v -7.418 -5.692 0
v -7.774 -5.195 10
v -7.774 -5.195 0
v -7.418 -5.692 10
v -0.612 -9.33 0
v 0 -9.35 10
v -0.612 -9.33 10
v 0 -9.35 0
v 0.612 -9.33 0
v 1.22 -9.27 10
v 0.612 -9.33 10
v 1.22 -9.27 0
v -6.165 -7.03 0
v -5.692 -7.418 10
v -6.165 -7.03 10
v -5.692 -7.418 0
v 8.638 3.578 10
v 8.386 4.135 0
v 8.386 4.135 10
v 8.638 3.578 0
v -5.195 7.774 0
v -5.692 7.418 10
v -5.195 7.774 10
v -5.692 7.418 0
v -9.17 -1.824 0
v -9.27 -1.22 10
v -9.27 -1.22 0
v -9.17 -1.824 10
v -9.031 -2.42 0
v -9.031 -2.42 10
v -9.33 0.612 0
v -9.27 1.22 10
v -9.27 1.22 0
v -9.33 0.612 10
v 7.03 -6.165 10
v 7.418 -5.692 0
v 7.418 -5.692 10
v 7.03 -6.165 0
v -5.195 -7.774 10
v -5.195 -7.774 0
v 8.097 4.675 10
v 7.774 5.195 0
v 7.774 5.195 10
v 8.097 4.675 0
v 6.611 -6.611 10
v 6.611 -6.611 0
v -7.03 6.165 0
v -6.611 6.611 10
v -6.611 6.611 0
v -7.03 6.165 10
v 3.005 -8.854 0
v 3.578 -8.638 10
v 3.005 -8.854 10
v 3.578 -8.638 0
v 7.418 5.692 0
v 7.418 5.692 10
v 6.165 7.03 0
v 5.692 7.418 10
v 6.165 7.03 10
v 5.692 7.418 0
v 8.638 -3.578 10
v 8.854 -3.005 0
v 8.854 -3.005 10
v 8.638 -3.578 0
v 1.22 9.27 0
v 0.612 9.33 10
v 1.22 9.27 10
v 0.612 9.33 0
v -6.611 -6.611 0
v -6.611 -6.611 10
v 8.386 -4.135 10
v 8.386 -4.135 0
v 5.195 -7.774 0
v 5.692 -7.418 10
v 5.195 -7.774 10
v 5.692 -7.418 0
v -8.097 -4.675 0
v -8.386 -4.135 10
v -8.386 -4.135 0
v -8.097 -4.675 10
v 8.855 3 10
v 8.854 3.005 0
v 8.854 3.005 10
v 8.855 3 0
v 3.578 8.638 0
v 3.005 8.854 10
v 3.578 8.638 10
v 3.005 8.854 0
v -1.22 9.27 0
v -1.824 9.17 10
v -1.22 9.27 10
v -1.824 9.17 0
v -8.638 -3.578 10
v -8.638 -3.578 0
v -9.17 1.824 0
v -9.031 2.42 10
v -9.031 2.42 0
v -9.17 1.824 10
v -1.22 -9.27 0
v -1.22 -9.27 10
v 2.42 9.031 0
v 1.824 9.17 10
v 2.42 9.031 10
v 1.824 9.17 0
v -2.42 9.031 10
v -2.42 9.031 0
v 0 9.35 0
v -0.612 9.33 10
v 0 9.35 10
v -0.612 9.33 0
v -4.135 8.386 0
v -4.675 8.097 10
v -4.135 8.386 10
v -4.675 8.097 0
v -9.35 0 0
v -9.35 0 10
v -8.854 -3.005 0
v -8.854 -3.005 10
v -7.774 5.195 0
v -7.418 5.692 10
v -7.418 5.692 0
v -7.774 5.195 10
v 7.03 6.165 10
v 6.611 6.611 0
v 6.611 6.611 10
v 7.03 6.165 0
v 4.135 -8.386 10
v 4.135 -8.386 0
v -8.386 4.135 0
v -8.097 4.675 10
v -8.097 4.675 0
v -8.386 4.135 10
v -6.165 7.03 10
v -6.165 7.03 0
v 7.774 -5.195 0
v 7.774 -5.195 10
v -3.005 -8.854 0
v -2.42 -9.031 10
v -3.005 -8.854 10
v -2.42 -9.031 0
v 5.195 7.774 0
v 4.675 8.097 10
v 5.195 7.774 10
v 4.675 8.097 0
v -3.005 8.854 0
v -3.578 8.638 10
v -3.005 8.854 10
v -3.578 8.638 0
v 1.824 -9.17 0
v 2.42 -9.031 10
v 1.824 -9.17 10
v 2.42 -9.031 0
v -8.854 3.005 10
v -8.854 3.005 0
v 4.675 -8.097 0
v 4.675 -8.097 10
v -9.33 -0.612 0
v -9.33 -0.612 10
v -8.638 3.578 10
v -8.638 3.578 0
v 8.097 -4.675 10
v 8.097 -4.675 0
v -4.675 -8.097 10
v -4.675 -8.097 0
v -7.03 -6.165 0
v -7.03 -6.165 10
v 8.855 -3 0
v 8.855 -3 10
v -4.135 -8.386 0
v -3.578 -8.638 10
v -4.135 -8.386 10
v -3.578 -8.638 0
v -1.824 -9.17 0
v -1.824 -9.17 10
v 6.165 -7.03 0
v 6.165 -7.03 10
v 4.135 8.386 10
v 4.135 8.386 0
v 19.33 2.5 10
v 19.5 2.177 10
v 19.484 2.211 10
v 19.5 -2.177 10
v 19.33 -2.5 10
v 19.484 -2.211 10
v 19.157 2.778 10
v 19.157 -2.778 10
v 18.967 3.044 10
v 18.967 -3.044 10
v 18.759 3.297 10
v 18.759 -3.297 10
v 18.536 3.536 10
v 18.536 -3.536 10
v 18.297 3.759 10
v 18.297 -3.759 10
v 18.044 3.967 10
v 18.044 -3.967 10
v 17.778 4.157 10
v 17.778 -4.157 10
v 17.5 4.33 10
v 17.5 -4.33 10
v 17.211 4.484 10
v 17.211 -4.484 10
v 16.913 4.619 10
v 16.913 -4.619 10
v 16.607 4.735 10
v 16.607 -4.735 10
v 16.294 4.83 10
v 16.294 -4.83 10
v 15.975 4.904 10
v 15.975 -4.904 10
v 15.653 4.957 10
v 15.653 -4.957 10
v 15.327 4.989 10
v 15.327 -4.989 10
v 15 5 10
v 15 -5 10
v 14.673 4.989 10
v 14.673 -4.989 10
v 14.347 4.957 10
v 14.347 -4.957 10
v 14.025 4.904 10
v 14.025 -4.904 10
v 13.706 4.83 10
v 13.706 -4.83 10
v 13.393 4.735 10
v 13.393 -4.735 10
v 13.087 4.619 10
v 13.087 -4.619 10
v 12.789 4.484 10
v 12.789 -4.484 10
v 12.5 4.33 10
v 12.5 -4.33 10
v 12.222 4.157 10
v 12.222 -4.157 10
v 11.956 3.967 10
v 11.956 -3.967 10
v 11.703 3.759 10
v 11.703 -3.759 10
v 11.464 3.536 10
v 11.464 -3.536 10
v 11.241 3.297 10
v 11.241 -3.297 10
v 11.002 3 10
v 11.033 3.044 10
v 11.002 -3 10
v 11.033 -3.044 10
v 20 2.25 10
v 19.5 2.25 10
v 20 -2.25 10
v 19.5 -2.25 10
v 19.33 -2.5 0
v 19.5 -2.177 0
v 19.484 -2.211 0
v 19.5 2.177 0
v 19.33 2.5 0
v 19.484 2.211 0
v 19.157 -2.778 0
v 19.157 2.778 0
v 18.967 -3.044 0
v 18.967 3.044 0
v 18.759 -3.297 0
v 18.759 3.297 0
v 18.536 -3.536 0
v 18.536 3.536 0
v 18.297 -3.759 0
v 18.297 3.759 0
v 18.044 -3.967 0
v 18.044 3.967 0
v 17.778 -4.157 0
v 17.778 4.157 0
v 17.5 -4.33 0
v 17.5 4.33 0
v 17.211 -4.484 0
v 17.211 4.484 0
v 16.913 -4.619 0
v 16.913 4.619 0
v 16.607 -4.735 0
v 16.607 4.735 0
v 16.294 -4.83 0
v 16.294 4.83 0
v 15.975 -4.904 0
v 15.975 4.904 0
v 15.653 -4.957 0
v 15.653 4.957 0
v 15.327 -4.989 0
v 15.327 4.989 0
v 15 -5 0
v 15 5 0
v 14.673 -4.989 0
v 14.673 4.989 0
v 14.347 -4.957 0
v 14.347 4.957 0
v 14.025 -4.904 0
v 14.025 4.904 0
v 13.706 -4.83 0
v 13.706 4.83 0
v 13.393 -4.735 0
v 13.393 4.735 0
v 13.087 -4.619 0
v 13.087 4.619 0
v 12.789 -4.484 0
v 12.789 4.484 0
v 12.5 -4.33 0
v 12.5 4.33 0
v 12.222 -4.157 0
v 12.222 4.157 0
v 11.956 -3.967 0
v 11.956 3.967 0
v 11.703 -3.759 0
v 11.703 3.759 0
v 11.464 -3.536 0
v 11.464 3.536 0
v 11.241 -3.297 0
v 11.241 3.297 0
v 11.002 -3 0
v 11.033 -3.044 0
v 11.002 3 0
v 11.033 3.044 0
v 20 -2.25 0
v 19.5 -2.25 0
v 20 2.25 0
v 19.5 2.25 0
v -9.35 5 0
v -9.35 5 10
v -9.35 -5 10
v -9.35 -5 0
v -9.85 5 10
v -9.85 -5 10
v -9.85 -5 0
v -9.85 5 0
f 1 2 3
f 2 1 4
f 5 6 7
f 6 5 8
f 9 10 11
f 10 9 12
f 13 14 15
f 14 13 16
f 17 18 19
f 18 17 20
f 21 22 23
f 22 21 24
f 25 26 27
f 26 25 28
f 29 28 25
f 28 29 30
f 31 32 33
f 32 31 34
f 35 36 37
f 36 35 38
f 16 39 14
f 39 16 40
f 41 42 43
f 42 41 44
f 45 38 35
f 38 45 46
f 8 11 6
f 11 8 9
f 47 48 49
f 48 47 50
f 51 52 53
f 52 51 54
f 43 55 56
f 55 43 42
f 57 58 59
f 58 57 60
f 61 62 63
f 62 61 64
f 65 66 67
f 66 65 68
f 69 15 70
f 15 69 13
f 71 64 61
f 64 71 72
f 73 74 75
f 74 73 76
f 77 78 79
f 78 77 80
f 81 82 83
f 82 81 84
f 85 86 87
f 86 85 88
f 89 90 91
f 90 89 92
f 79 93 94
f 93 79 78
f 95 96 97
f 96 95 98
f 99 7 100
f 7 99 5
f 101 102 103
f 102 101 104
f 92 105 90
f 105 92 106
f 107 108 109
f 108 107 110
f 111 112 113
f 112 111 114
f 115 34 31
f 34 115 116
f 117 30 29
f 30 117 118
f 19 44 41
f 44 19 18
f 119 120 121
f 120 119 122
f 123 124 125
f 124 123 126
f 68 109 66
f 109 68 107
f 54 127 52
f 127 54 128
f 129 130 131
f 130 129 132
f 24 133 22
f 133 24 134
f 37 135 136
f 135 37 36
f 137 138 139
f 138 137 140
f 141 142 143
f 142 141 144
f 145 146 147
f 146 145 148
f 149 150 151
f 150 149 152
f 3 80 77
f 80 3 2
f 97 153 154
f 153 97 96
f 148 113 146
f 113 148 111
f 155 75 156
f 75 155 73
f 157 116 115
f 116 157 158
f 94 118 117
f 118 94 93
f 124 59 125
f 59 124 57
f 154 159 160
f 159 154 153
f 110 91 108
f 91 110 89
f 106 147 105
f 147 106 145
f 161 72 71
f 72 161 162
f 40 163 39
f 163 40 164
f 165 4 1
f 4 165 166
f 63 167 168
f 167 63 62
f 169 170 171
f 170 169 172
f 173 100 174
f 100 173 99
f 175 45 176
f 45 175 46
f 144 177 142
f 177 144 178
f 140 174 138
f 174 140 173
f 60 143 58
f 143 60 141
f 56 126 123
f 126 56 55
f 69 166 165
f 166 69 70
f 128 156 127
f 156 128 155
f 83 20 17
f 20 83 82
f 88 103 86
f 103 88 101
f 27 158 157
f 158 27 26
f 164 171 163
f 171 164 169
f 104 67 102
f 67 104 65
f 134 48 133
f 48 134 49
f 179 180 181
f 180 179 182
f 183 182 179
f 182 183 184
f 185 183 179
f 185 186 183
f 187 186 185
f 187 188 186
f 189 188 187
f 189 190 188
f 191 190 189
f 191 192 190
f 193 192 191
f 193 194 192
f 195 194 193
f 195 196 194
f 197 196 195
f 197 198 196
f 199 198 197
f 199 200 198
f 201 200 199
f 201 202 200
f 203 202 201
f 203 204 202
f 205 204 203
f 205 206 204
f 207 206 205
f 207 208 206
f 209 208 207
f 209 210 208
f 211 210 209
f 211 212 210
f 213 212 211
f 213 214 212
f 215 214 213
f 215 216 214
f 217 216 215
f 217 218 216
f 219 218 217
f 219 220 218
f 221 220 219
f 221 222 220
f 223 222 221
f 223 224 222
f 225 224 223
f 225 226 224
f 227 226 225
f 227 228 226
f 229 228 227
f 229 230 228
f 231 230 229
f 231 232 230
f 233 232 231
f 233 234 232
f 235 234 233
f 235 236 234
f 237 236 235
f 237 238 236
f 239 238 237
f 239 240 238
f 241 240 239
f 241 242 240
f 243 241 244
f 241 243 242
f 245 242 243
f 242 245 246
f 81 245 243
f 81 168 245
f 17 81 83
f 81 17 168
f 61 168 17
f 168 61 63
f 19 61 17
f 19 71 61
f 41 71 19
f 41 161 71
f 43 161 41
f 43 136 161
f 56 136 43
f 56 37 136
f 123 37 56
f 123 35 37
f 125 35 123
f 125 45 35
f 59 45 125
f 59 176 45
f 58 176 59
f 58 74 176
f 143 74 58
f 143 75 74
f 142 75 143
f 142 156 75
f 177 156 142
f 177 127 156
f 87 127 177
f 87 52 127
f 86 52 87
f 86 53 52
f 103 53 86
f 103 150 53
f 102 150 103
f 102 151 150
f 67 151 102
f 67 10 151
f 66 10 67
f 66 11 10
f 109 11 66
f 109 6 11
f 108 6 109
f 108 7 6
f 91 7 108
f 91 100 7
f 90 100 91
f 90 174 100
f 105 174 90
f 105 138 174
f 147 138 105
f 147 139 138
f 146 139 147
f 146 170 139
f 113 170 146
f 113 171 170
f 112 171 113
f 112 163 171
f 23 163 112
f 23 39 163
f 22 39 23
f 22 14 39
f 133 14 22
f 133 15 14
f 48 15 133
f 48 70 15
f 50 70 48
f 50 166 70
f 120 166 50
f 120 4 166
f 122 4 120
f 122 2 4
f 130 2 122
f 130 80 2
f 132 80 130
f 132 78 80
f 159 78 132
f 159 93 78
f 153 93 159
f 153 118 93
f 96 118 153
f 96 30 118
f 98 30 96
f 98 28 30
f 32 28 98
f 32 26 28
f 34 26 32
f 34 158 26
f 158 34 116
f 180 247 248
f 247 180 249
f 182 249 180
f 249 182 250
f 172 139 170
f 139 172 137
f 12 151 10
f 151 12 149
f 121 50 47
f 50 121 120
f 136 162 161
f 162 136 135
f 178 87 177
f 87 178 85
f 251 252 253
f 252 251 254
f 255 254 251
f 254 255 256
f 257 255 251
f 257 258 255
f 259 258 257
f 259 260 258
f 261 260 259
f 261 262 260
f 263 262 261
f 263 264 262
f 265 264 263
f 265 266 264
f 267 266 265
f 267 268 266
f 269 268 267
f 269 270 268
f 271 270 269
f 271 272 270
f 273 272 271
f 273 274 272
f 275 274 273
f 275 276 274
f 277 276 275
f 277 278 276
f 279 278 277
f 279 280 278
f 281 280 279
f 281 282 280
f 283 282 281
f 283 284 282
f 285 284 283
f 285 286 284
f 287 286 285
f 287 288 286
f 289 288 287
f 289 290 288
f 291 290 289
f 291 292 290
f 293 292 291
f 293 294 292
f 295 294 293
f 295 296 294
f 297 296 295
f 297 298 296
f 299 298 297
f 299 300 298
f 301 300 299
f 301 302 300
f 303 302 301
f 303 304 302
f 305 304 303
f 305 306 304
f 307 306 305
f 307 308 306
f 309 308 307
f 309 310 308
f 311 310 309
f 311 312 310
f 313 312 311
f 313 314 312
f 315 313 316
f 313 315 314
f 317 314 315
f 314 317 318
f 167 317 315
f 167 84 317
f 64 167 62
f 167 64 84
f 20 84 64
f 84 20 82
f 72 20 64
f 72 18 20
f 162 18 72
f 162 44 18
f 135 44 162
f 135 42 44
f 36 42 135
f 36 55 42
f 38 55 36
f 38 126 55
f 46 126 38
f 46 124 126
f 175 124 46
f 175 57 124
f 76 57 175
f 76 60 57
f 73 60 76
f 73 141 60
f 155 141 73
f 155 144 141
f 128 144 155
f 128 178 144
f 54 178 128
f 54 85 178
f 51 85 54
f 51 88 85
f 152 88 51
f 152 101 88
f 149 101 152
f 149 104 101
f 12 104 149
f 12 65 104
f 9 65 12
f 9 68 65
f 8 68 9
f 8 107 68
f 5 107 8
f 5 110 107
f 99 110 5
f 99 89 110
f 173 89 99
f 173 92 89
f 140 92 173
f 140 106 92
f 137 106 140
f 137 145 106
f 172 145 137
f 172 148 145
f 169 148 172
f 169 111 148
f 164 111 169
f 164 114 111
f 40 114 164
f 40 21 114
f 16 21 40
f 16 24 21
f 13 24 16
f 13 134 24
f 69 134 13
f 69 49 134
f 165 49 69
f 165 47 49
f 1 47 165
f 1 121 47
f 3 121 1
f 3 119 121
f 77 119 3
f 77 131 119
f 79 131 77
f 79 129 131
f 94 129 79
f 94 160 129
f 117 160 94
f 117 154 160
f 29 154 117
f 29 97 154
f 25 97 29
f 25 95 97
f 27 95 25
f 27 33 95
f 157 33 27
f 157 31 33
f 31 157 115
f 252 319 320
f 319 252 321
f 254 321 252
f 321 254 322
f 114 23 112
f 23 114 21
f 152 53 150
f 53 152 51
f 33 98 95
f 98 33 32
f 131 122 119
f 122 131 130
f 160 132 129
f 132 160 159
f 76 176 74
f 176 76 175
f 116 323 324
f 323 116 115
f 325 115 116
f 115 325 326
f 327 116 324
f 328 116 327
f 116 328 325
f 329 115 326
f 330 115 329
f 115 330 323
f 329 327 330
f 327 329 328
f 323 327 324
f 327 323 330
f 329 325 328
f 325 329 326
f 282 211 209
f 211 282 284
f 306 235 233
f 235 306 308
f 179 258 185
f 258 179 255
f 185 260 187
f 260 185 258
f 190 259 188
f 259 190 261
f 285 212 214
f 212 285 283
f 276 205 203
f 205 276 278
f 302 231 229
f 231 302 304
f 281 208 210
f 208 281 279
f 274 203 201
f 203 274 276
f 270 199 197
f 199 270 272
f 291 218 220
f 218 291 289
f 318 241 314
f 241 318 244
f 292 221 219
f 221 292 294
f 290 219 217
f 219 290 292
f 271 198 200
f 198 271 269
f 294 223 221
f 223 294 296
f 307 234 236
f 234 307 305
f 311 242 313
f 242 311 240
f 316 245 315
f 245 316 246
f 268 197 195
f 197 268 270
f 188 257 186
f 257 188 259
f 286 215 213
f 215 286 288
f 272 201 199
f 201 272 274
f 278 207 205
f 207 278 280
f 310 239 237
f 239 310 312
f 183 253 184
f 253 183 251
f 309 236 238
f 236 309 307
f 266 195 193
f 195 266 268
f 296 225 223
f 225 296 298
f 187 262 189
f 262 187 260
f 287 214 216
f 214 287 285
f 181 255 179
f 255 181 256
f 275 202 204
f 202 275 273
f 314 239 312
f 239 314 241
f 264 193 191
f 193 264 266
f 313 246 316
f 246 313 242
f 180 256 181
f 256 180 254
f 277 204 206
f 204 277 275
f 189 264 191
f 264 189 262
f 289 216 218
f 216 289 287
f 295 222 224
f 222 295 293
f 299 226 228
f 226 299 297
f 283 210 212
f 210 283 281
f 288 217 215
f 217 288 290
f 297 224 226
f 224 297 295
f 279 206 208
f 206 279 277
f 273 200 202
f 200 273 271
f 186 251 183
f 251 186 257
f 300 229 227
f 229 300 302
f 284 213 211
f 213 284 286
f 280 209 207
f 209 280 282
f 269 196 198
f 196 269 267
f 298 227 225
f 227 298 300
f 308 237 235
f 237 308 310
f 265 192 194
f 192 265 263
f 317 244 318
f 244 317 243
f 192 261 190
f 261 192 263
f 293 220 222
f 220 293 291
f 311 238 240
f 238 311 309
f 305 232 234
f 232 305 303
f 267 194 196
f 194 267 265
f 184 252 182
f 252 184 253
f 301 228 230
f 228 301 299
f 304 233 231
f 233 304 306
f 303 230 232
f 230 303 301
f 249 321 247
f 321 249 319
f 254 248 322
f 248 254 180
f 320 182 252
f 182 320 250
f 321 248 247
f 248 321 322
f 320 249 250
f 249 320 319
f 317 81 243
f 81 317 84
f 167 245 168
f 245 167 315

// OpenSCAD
// Snap-on clip: rod ring + tubing ring + bridge
// Print orientation: flat on bed, extrusion along +Z

$fn = 96;

// ---- Rod ring ----
rod_id     = 12.7;   // rod inner diameter
rod_wall   = 3;      // ring wall thickness
rod_od     = rod_id + 2 * rod_wall; // 18.7 mm outer diameter
rod_open   = 10;     // opening width on -X side

// ---- Tubing ring ----
tube_id    = 6;      // tubing inner diameter
tube_wall  = 2;      // ring wall thickness
tube_od    = tube_id + 2 * tube_wall; // 10 mm outer diameter
tube_x     = 15;     // ring centre X
tube_open  = 4.5;    // opening width on +X side

// ---- Bridge ----
bridge_w   = 6;      // bridge width in Y
bridge_x0  = 8;      // bridge start X
bridge_x1  = 12;     // bridge end X

// ---- Misc ----
eps        = 0.5;    // cutter overshoot past faces

difference() {
    union() {
        // Rod ring
        cylinder(d = rod_od, h = 10);
        translate([-rod_od / 2 - eps, -rod_open / 2, 0])
            cube([eps, rod_open, 10]);
        // Tubing ring
        translate([tube_x, 0, 0])
            cylinder(d = tube_od, h = 10);
        translate([tube_x + tube_od / 2 - eps, -tube_open / 2, 0])
            cube([eps, tube_open, 10]);
        // Bridge
        translate([bridge_x0, -bridge_w / 2, 0])
            cube([bridge_x1 - bridge_x0, bridge_w, 10]);
    }
}
